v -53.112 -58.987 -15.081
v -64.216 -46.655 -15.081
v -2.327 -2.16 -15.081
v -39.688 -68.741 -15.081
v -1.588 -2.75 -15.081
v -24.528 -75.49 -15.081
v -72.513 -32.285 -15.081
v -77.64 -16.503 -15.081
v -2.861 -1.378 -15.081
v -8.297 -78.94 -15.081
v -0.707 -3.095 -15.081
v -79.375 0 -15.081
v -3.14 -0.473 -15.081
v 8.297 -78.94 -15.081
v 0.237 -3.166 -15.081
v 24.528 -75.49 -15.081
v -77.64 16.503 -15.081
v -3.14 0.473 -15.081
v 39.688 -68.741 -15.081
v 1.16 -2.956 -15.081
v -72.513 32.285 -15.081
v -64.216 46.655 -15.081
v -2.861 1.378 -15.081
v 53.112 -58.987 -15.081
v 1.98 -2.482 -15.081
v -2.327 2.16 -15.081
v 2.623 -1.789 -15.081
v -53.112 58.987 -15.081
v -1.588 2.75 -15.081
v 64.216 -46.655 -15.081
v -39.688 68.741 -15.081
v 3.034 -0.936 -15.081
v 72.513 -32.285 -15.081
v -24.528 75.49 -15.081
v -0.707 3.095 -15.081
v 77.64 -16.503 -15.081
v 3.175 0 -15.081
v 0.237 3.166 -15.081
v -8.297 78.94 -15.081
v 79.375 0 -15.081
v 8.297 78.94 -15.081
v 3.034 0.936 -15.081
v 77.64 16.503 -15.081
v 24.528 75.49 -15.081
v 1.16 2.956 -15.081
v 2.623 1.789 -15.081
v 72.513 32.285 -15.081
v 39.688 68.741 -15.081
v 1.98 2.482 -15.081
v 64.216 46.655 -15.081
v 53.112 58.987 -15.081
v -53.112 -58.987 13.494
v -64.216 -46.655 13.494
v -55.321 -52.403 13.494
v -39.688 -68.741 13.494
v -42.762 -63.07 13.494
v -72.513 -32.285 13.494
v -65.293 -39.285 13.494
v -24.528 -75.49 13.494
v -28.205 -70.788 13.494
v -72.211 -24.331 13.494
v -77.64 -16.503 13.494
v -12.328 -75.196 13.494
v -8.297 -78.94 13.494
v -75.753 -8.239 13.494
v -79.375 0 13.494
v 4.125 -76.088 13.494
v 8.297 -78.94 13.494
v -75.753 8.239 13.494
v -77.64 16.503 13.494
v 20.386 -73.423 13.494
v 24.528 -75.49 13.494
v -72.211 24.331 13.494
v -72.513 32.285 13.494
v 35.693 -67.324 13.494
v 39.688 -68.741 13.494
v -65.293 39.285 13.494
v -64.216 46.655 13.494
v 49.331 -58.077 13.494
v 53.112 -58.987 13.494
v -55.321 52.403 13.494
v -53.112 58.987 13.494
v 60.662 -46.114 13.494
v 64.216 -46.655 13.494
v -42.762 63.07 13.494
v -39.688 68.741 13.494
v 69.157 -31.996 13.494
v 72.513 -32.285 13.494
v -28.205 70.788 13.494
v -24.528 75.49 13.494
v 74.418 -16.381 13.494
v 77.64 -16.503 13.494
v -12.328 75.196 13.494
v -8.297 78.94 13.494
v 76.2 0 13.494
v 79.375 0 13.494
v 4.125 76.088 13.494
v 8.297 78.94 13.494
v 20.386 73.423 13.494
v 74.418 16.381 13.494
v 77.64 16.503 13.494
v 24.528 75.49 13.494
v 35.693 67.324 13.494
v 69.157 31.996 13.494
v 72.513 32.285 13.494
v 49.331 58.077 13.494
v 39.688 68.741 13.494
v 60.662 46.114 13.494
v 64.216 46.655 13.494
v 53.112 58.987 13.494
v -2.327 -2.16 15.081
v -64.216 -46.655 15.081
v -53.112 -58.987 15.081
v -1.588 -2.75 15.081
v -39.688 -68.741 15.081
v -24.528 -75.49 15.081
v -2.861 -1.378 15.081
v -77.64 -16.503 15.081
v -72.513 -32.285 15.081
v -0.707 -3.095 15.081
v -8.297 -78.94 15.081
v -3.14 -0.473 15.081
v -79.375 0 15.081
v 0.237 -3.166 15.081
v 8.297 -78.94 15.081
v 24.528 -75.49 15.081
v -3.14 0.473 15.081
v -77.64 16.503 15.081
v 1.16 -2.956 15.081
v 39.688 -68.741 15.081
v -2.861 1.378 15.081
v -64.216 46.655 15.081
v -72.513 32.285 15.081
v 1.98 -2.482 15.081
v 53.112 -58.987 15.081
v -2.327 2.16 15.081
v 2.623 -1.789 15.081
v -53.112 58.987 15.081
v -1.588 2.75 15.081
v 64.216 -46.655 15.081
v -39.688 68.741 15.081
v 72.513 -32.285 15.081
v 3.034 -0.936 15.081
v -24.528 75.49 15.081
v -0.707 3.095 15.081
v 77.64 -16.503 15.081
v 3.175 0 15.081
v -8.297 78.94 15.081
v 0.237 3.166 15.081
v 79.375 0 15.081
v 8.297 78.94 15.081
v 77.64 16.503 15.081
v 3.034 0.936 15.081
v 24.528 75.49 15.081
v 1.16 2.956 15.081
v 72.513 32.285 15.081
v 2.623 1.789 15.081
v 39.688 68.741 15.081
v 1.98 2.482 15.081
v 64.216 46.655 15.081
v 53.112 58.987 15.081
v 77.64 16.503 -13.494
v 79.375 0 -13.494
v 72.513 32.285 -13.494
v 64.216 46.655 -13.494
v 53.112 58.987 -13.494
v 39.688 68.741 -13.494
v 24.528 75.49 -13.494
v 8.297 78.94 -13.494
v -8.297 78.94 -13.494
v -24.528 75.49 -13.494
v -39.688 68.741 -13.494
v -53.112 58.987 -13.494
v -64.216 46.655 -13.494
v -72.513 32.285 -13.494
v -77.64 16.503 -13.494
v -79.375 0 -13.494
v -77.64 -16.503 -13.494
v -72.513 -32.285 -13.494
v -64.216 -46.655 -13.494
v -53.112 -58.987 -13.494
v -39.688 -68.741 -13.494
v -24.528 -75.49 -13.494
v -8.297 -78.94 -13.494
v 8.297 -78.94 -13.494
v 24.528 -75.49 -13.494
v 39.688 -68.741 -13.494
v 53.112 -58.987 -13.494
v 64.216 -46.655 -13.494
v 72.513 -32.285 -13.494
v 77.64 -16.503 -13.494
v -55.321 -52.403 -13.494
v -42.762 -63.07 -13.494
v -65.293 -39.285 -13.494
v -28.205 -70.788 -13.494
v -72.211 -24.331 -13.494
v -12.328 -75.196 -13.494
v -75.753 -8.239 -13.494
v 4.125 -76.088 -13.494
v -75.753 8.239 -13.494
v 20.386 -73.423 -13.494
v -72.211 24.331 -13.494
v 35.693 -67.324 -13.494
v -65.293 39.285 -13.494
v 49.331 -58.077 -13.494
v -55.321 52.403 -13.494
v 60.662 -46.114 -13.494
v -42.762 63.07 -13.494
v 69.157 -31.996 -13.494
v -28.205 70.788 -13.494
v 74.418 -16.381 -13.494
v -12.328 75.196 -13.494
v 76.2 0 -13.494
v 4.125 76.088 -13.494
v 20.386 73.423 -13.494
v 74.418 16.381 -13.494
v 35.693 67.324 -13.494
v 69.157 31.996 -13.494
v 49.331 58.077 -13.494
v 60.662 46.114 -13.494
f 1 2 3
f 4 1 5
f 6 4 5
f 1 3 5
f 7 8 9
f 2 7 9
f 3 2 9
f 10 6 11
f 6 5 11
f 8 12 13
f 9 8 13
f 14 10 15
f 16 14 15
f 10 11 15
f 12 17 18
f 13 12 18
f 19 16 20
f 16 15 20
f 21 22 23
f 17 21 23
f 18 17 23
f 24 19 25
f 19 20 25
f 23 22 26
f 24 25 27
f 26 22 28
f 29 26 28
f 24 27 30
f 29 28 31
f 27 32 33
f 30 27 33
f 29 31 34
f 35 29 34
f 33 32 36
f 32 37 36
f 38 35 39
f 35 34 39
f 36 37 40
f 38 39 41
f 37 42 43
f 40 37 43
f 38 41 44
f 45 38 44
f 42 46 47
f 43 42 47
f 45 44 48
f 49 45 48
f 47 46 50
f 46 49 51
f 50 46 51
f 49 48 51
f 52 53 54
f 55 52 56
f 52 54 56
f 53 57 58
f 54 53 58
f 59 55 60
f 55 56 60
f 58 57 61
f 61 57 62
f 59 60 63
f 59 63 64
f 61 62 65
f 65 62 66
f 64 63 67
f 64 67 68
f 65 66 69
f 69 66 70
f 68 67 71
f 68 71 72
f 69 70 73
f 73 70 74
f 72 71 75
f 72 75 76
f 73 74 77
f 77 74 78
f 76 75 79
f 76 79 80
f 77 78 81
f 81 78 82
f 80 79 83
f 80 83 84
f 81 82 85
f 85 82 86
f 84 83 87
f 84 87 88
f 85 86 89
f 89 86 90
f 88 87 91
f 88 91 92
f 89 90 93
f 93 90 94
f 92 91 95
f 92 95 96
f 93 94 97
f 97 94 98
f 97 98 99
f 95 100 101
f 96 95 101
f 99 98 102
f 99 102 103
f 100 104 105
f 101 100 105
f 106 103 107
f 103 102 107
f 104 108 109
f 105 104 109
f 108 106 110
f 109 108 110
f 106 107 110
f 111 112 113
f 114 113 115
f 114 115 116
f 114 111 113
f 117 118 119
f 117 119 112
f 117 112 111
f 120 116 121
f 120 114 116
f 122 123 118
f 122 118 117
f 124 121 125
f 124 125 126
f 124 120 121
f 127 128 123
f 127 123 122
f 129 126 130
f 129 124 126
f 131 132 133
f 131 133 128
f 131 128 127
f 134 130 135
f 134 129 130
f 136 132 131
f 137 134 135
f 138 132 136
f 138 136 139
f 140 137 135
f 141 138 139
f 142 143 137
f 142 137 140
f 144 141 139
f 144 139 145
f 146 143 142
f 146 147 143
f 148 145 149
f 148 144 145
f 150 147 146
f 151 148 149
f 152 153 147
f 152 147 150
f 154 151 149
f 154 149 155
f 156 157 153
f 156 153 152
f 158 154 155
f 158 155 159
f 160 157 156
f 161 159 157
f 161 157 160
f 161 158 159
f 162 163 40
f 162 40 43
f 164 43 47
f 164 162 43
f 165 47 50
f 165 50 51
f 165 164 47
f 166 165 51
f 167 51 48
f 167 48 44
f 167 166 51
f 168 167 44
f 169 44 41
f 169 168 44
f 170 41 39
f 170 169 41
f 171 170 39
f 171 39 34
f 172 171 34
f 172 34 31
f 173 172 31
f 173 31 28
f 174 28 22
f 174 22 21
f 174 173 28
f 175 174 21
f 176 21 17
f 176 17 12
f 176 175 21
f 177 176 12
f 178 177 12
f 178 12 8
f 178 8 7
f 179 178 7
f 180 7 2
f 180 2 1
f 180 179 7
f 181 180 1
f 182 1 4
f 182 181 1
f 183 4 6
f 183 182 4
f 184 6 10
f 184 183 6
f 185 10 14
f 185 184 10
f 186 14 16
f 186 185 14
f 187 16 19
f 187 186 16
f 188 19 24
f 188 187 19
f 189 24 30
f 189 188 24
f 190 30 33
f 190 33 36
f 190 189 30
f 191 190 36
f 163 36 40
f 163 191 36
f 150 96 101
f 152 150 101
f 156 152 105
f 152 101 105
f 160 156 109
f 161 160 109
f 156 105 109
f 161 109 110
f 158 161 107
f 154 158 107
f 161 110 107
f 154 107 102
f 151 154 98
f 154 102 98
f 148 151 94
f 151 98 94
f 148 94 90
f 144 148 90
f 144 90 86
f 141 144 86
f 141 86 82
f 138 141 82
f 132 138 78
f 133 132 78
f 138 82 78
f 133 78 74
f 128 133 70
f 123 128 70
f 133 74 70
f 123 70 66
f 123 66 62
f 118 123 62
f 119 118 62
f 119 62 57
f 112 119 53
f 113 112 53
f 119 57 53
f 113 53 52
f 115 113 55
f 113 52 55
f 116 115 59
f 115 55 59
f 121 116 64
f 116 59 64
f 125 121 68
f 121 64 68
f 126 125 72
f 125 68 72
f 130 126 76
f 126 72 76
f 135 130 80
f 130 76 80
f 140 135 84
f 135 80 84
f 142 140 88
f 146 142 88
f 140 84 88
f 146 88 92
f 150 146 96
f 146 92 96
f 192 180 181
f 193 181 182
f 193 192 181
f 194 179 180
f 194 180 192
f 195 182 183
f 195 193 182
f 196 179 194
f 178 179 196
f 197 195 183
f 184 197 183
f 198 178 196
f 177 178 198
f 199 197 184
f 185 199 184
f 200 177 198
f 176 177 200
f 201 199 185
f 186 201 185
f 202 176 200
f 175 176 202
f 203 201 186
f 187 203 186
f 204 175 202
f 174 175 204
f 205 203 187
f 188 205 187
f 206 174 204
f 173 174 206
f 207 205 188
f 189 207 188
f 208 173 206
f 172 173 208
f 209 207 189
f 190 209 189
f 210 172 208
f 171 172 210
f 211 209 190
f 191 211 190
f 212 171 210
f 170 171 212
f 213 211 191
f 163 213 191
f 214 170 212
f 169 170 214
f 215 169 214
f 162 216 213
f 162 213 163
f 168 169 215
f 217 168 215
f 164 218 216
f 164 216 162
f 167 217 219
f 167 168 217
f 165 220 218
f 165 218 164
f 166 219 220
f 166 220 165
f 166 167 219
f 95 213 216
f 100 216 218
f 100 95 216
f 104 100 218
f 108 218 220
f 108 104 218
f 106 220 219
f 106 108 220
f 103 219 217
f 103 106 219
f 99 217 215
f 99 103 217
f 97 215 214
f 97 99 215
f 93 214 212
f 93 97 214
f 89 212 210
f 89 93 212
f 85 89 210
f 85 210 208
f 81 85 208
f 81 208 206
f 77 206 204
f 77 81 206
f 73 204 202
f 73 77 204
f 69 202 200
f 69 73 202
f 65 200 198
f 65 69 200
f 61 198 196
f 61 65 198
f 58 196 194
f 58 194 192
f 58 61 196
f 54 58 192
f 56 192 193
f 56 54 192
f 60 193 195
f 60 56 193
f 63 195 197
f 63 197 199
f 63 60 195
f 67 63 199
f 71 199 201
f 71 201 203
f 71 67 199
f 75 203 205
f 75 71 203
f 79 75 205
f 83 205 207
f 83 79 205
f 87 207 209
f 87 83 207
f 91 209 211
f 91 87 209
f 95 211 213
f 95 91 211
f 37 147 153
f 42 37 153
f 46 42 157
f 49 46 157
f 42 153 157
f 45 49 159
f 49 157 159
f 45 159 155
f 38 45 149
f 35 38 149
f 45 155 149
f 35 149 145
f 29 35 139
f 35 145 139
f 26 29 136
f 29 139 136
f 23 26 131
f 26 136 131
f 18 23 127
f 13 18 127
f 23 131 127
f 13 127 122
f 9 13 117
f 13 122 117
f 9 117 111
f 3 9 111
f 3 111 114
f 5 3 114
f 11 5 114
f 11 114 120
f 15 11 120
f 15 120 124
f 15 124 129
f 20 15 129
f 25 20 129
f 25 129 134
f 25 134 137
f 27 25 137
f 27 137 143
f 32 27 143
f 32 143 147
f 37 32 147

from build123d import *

# Parameters (mm, degrees)
INNER_R             = 76.2
BOSS_EXTRUDE1_DEPTH = 13.49375
RIM_R               = 79.375
BOSS_EXTRUDE2_DEPTH = 1.5875
HOLE_R              = 3.175
CUT_EXTRUDE1_DEPTH  = 31.1625


with BuildPart() as part:
    # Inner → Boss-Extrude1 (new body)
    with BuildSketch(Plane.XY):
        Circle(INNER_R)
    extrude(amount=BOSS_EXTRUDE1_DEPTH)

    # Rim → Boss-Extrude2 (add)
    with BuildSketch(Plane.XY.offset(13.49375)):
        Circle(RIM_R)
    extrude(amount=BOSS_EXTRUDE2_DEPTH)

    # Mirror1: part across plane


with BuildPart() as part_1:
    add(part.part)
    add(part.part.mirror(Plane.XY))

    # Hole → Cut-Extrude1 (cut, through all)
    with BuildSketch(Plane.XY.offset(15.08125)):
        Circle(HOLE_R)
    extrude(amount=-CUT_EXTRUDE1_DEPTH, mode=Mode.SUBTRACT)


solid = part_1.part
